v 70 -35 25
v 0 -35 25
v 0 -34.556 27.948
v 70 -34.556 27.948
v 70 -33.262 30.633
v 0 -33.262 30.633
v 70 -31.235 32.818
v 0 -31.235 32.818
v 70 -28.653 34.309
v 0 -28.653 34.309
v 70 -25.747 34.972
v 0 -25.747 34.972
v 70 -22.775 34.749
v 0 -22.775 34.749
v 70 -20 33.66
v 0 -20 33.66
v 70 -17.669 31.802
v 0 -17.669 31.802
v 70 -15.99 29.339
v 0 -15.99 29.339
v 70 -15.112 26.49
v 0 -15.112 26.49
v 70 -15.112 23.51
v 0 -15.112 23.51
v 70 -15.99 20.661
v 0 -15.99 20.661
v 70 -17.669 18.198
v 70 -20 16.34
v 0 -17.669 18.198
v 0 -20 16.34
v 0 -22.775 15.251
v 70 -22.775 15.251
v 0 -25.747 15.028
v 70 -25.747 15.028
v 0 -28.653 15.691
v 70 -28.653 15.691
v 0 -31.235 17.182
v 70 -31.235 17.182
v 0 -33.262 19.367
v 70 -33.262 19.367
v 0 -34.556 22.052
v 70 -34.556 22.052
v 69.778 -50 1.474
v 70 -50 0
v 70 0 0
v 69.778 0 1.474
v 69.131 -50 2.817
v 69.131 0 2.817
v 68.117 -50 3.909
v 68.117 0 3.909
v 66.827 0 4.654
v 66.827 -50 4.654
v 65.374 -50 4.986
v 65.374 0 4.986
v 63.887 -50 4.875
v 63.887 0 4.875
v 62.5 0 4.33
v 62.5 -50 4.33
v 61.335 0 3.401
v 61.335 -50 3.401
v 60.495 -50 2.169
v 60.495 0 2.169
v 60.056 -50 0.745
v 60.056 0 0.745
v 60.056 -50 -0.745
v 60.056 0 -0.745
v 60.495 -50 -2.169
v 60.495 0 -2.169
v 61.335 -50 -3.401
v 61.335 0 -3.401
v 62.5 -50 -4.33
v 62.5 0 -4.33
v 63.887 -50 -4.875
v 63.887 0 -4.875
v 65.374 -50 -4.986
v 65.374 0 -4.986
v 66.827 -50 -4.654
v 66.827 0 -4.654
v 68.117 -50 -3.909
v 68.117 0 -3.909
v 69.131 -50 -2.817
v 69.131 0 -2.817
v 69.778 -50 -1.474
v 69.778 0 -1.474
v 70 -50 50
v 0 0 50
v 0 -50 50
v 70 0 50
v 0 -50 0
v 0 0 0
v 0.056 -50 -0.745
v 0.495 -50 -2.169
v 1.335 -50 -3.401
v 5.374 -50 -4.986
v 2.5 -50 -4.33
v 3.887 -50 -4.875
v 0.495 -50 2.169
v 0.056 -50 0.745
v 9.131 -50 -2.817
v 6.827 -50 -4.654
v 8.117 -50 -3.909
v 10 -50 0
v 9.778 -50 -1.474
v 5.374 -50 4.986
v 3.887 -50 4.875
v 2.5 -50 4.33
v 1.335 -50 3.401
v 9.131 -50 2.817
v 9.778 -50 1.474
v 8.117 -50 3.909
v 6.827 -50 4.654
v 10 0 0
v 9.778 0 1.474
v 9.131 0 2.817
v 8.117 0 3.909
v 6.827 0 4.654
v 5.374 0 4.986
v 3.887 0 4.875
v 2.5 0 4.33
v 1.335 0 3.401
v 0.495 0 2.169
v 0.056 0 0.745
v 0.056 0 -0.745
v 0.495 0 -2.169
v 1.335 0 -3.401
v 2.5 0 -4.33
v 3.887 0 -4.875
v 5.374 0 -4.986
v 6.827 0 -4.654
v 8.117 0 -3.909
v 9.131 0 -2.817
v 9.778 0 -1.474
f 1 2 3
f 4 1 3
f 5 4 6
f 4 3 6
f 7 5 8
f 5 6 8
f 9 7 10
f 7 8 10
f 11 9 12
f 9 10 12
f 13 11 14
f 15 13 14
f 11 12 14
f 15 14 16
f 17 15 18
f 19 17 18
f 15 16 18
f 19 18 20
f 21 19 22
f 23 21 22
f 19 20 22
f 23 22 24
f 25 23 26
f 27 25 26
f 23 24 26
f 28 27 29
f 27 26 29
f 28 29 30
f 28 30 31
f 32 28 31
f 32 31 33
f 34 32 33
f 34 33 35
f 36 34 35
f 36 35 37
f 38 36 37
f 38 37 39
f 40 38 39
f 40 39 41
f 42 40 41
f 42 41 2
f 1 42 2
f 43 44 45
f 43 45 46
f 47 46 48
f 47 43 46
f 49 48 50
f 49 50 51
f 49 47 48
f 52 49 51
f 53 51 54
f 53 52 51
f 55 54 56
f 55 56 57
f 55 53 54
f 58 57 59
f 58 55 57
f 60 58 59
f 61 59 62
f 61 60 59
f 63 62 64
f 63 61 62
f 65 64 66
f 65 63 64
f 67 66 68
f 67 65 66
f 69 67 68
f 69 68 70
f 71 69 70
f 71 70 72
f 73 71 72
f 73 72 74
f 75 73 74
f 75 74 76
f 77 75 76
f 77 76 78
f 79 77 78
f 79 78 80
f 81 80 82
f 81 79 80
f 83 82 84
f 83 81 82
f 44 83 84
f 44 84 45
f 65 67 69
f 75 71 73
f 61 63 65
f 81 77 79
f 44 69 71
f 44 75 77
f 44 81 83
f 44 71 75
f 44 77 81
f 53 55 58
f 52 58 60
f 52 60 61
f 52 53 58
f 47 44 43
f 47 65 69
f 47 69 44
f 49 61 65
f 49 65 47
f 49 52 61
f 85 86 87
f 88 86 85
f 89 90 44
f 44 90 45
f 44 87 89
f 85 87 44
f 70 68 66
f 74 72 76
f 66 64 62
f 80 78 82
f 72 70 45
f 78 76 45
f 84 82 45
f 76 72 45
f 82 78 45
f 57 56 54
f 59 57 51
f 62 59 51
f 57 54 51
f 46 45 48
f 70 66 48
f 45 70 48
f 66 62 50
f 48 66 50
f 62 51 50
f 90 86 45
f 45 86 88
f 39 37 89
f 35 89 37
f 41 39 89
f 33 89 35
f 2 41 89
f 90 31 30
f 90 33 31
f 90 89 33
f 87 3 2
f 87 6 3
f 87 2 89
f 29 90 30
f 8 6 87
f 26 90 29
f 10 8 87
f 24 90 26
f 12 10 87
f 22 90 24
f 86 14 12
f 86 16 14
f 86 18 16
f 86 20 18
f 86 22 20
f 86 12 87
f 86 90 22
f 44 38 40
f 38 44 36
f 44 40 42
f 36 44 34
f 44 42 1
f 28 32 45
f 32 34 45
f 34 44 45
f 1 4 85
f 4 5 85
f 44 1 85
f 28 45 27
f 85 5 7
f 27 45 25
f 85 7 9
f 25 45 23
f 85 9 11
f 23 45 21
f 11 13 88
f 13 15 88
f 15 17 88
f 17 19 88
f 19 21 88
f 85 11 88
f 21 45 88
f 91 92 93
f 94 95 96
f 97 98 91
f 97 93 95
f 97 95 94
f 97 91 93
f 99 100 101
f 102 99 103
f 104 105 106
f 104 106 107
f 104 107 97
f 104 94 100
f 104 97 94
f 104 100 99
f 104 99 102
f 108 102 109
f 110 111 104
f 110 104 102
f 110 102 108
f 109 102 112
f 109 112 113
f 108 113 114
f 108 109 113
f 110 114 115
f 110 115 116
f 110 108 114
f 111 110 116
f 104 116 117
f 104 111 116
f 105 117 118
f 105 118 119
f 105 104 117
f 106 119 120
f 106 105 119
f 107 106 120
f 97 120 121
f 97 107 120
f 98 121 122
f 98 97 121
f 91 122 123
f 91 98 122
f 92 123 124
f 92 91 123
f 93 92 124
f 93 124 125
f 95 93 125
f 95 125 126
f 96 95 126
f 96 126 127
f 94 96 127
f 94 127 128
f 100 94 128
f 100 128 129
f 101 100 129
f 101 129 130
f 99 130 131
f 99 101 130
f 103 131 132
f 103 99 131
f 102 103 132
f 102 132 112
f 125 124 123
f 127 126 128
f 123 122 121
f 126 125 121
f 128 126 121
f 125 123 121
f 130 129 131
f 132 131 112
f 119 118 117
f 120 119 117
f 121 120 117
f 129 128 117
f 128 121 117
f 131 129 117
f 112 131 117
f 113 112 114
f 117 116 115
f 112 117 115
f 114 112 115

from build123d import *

# Parameters (mm, degrees)
F0_W     = 70
F0_H     = 50
F1_DEPTH = 50
F2_R     = 5
F3_DEPTH = 50
F4_R     = 10
F5_DEPTH = 70.001


with BuildPart() as f1:
    # F0 (on Front) → F1 (new body)
    with BuildSketch(Plane.XZ):
        with Locations((34.999998, 25)):
            Rectangle(F0_W, F0_H)
    extrude(amount=F1_DEPTH)

    # F4 (on face) → F5 (cut, through all)
    with BuildSketch(Plane(origin=(-2e-06, 0, 0), x_dir=(0, -1, 0), z_dir=(-1, 0, 0))):
        with Locations((25, 25)):
            Circle(F4_R)
    extrude(amount=-F5_DEPTH, mode=Mode.SUBTRACT)


with BuildPart() as f3:
    # F2 (on face) → F3 (new body)
    with BuildSketch(Plane.XZ.offset(50)):
        with Locations((5, 0)):
            Circle(F2_R)
        with Locations((64.999995, 0)):
            Circle(F2_R)
    extrude(amount=-F3_DEPTH)


solid = Compound([f1.part, f3.part])
